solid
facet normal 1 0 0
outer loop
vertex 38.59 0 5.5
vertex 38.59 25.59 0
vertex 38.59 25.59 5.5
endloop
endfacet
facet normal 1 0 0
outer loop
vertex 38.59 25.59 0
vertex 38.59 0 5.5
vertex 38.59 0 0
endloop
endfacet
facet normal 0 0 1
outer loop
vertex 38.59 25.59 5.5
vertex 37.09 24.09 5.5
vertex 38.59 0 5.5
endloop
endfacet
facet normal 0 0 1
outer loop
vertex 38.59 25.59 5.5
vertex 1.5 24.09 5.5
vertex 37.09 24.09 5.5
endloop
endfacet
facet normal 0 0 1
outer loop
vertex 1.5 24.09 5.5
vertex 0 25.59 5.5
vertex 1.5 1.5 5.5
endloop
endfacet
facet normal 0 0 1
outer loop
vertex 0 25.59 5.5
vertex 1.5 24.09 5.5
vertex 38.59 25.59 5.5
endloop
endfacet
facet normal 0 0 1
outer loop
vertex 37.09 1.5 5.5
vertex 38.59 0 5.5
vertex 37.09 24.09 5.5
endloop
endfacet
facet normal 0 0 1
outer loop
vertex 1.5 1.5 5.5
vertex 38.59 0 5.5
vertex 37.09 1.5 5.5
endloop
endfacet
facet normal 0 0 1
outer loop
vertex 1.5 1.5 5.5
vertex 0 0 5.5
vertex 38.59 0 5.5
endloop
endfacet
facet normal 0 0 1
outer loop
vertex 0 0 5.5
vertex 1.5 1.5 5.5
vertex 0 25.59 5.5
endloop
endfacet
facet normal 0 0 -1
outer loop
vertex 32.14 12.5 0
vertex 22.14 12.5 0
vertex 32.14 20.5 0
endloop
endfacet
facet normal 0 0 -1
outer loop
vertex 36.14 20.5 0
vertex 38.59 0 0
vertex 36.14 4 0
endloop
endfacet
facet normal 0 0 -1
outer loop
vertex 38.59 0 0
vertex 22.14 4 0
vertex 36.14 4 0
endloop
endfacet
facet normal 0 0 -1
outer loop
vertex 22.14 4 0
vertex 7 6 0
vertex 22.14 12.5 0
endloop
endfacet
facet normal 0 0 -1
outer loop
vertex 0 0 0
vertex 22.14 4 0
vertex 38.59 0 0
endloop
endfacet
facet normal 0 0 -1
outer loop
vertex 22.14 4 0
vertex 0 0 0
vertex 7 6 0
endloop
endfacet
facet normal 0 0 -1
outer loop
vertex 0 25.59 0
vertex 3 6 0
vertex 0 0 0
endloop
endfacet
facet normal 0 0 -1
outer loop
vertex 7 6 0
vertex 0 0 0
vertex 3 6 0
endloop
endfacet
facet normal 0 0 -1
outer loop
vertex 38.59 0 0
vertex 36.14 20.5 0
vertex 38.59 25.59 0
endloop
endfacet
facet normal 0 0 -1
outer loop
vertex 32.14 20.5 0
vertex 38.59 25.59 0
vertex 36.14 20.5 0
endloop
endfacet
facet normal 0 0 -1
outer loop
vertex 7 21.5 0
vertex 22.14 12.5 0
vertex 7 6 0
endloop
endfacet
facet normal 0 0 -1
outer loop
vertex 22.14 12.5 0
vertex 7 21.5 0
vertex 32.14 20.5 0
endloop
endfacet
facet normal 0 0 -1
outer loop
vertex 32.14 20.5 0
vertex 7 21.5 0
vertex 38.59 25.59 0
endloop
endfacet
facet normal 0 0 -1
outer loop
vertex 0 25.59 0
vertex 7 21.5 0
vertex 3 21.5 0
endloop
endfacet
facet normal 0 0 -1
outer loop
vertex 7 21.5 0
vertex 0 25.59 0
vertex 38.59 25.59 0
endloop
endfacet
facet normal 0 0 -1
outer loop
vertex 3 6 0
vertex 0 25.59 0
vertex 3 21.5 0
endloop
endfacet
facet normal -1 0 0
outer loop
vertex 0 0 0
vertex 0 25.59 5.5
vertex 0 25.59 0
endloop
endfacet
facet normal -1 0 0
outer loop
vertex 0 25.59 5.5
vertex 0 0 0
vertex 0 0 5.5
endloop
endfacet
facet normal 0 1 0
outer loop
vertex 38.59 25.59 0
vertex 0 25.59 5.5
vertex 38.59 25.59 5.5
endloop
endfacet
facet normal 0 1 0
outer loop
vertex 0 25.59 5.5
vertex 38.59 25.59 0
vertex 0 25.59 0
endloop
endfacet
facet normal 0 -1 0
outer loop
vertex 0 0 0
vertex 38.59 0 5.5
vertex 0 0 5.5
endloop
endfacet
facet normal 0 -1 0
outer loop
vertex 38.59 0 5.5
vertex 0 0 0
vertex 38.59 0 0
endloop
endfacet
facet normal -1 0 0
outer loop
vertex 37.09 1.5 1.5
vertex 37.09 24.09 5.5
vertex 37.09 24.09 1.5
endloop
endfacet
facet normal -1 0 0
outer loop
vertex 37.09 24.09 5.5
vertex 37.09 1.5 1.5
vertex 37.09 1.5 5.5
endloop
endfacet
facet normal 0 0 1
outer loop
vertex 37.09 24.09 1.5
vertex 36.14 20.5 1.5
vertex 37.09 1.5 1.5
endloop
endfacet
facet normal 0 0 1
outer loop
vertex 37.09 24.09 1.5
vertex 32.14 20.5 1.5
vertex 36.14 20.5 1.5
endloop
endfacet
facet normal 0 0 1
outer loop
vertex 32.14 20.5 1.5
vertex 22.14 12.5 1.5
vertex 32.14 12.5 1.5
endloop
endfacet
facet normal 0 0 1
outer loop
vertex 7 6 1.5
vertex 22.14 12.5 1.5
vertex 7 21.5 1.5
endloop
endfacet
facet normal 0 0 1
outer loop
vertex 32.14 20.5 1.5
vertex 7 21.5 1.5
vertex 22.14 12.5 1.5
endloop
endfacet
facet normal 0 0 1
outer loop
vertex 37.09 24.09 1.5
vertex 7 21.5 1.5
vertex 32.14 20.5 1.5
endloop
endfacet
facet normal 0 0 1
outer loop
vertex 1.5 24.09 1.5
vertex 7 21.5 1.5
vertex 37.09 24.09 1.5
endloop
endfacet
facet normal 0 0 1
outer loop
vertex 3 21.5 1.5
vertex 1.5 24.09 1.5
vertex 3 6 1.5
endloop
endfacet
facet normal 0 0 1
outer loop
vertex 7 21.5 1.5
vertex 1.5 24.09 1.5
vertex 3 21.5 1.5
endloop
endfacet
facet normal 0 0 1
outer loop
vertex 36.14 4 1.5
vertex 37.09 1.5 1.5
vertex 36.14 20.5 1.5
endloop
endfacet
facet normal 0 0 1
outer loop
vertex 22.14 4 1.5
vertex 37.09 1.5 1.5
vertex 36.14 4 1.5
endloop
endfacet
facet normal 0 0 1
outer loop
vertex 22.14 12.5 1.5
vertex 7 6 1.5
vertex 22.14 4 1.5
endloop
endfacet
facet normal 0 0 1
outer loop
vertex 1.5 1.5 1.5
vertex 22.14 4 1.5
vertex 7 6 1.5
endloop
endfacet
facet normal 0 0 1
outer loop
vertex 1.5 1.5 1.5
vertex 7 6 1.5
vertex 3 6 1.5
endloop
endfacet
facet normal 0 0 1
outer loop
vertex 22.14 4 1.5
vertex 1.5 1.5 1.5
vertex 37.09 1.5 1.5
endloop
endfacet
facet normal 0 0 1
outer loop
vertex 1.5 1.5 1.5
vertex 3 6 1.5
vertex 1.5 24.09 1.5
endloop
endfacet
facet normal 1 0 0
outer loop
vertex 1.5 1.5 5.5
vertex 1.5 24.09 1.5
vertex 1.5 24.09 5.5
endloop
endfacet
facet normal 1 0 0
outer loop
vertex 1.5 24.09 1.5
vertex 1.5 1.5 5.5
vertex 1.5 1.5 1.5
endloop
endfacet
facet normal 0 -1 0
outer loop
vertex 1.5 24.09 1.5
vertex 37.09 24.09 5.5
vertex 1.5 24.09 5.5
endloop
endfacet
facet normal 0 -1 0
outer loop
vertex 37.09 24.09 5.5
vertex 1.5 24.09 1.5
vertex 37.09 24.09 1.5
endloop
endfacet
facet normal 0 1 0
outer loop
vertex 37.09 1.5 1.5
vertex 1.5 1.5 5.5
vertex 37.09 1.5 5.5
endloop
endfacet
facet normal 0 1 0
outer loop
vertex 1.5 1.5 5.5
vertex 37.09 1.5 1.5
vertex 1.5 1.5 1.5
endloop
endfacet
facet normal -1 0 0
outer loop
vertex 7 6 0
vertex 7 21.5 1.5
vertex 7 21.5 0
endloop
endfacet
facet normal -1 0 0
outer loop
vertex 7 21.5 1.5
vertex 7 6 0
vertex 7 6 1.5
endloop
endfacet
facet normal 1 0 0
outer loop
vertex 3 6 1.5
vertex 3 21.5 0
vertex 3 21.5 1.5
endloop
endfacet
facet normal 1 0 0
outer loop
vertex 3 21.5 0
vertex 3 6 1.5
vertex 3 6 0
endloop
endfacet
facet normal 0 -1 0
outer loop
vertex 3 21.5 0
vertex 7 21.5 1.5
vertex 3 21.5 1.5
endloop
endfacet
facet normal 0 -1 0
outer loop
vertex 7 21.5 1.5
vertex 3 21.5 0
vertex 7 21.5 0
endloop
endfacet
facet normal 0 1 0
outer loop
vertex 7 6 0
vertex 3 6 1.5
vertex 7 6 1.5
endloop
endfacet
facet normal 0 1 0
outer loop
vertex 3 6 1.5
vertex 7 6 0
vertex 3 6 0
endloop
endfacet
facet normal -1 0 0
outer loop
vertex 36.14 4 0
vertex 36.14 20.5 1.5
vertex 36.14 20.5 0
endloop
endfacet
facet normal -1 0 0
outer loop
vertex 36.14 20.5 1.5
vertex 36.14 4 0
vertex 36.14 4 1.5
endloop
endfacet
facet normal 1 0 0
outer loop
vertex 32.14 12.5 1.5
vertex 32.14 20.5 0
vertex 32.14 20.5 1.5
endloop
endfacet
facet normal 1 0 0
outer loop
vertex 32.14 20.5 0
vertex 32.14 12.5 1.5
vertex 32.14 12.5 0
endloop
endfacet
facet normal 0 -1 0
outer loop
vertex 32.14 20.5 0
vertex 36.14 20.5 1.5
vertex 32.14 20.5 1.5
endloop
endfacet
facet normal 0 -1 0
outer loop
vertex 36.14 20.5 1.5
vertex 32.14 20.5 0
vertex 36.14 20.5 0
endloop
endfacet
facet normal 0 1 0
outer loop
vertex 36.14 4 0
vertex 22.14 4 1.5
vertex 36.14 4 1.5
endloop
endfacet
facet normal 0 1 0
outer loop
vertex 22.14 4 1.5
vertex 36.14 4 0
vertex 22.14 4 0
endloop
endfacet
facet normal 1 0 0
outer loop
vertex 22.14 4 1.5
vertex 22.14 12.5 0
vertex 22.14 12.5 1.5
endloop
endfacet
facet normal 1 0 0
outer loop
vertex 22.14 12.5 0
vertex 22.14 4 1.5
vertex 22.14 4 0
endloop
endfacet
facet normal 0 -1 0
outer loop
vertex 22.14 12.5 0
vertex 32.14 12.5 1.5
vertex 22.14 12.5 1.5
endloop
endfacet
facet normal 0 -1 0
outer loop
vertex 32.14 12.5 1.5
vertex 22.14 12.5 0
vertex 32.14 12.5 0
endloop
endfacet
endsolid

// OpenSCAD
corr = $preview ? .1 : 0;

x=32.64;
//x2=26.46;
//x3=11.46;
//win_idx=10;
win_idx=9;
win_sz=10;
y=19.64;
z=13;
pad=.5;
walls=2;
lokk=1.5;
//bleed=0;
bleed=.45;

lag_bunn=0;
lag_lokk=1;

if (lag_bunn) {
    difference() {
        cube([x+pad+walls,y+pad+walls,z+pad+walls]);
        translate([walls/2,walls/2,walls]) {
            cube([x+pad,y+pad,z+pad+corr]);
        }
        rotate([90,0,90]) {
            translate([-corr,walls-corr,win_idx-corr]) {
                cube([walls+corr,z+pad+corr,win_sz+corr]);
            }
        }
    }
}

// lokk
if (lag_lokk) {
    translate([-lokk*lag_bunn,-30*lag_bunn,0]) {
        difference() {
            cube([x+pad+walls+lokk*2+bleed,y+pad+lokk*2+walls+bleed,pad+walls+lokk*2]);
            translate([lokk,lokk,lokk]) {
                cube([x+pad+walls+bleed,y+pad+walls+bleed,lokk+pad+walls+corr]);
            }
            // gløpper
            translate([walls*1.5,walls*3,-corr]) {
                cube([4,15.5,lokk+corr*2]);
            }
            translate([x-walls/4,walls*2,-corr]) {
                cube([4,16.5,lokk+corr*2]);
            }
            translate([x-walls/4-10,walls*2,-corr]) {
                cube([10,8.5,lokk+corr*2]);
            }
        }
    }
}
